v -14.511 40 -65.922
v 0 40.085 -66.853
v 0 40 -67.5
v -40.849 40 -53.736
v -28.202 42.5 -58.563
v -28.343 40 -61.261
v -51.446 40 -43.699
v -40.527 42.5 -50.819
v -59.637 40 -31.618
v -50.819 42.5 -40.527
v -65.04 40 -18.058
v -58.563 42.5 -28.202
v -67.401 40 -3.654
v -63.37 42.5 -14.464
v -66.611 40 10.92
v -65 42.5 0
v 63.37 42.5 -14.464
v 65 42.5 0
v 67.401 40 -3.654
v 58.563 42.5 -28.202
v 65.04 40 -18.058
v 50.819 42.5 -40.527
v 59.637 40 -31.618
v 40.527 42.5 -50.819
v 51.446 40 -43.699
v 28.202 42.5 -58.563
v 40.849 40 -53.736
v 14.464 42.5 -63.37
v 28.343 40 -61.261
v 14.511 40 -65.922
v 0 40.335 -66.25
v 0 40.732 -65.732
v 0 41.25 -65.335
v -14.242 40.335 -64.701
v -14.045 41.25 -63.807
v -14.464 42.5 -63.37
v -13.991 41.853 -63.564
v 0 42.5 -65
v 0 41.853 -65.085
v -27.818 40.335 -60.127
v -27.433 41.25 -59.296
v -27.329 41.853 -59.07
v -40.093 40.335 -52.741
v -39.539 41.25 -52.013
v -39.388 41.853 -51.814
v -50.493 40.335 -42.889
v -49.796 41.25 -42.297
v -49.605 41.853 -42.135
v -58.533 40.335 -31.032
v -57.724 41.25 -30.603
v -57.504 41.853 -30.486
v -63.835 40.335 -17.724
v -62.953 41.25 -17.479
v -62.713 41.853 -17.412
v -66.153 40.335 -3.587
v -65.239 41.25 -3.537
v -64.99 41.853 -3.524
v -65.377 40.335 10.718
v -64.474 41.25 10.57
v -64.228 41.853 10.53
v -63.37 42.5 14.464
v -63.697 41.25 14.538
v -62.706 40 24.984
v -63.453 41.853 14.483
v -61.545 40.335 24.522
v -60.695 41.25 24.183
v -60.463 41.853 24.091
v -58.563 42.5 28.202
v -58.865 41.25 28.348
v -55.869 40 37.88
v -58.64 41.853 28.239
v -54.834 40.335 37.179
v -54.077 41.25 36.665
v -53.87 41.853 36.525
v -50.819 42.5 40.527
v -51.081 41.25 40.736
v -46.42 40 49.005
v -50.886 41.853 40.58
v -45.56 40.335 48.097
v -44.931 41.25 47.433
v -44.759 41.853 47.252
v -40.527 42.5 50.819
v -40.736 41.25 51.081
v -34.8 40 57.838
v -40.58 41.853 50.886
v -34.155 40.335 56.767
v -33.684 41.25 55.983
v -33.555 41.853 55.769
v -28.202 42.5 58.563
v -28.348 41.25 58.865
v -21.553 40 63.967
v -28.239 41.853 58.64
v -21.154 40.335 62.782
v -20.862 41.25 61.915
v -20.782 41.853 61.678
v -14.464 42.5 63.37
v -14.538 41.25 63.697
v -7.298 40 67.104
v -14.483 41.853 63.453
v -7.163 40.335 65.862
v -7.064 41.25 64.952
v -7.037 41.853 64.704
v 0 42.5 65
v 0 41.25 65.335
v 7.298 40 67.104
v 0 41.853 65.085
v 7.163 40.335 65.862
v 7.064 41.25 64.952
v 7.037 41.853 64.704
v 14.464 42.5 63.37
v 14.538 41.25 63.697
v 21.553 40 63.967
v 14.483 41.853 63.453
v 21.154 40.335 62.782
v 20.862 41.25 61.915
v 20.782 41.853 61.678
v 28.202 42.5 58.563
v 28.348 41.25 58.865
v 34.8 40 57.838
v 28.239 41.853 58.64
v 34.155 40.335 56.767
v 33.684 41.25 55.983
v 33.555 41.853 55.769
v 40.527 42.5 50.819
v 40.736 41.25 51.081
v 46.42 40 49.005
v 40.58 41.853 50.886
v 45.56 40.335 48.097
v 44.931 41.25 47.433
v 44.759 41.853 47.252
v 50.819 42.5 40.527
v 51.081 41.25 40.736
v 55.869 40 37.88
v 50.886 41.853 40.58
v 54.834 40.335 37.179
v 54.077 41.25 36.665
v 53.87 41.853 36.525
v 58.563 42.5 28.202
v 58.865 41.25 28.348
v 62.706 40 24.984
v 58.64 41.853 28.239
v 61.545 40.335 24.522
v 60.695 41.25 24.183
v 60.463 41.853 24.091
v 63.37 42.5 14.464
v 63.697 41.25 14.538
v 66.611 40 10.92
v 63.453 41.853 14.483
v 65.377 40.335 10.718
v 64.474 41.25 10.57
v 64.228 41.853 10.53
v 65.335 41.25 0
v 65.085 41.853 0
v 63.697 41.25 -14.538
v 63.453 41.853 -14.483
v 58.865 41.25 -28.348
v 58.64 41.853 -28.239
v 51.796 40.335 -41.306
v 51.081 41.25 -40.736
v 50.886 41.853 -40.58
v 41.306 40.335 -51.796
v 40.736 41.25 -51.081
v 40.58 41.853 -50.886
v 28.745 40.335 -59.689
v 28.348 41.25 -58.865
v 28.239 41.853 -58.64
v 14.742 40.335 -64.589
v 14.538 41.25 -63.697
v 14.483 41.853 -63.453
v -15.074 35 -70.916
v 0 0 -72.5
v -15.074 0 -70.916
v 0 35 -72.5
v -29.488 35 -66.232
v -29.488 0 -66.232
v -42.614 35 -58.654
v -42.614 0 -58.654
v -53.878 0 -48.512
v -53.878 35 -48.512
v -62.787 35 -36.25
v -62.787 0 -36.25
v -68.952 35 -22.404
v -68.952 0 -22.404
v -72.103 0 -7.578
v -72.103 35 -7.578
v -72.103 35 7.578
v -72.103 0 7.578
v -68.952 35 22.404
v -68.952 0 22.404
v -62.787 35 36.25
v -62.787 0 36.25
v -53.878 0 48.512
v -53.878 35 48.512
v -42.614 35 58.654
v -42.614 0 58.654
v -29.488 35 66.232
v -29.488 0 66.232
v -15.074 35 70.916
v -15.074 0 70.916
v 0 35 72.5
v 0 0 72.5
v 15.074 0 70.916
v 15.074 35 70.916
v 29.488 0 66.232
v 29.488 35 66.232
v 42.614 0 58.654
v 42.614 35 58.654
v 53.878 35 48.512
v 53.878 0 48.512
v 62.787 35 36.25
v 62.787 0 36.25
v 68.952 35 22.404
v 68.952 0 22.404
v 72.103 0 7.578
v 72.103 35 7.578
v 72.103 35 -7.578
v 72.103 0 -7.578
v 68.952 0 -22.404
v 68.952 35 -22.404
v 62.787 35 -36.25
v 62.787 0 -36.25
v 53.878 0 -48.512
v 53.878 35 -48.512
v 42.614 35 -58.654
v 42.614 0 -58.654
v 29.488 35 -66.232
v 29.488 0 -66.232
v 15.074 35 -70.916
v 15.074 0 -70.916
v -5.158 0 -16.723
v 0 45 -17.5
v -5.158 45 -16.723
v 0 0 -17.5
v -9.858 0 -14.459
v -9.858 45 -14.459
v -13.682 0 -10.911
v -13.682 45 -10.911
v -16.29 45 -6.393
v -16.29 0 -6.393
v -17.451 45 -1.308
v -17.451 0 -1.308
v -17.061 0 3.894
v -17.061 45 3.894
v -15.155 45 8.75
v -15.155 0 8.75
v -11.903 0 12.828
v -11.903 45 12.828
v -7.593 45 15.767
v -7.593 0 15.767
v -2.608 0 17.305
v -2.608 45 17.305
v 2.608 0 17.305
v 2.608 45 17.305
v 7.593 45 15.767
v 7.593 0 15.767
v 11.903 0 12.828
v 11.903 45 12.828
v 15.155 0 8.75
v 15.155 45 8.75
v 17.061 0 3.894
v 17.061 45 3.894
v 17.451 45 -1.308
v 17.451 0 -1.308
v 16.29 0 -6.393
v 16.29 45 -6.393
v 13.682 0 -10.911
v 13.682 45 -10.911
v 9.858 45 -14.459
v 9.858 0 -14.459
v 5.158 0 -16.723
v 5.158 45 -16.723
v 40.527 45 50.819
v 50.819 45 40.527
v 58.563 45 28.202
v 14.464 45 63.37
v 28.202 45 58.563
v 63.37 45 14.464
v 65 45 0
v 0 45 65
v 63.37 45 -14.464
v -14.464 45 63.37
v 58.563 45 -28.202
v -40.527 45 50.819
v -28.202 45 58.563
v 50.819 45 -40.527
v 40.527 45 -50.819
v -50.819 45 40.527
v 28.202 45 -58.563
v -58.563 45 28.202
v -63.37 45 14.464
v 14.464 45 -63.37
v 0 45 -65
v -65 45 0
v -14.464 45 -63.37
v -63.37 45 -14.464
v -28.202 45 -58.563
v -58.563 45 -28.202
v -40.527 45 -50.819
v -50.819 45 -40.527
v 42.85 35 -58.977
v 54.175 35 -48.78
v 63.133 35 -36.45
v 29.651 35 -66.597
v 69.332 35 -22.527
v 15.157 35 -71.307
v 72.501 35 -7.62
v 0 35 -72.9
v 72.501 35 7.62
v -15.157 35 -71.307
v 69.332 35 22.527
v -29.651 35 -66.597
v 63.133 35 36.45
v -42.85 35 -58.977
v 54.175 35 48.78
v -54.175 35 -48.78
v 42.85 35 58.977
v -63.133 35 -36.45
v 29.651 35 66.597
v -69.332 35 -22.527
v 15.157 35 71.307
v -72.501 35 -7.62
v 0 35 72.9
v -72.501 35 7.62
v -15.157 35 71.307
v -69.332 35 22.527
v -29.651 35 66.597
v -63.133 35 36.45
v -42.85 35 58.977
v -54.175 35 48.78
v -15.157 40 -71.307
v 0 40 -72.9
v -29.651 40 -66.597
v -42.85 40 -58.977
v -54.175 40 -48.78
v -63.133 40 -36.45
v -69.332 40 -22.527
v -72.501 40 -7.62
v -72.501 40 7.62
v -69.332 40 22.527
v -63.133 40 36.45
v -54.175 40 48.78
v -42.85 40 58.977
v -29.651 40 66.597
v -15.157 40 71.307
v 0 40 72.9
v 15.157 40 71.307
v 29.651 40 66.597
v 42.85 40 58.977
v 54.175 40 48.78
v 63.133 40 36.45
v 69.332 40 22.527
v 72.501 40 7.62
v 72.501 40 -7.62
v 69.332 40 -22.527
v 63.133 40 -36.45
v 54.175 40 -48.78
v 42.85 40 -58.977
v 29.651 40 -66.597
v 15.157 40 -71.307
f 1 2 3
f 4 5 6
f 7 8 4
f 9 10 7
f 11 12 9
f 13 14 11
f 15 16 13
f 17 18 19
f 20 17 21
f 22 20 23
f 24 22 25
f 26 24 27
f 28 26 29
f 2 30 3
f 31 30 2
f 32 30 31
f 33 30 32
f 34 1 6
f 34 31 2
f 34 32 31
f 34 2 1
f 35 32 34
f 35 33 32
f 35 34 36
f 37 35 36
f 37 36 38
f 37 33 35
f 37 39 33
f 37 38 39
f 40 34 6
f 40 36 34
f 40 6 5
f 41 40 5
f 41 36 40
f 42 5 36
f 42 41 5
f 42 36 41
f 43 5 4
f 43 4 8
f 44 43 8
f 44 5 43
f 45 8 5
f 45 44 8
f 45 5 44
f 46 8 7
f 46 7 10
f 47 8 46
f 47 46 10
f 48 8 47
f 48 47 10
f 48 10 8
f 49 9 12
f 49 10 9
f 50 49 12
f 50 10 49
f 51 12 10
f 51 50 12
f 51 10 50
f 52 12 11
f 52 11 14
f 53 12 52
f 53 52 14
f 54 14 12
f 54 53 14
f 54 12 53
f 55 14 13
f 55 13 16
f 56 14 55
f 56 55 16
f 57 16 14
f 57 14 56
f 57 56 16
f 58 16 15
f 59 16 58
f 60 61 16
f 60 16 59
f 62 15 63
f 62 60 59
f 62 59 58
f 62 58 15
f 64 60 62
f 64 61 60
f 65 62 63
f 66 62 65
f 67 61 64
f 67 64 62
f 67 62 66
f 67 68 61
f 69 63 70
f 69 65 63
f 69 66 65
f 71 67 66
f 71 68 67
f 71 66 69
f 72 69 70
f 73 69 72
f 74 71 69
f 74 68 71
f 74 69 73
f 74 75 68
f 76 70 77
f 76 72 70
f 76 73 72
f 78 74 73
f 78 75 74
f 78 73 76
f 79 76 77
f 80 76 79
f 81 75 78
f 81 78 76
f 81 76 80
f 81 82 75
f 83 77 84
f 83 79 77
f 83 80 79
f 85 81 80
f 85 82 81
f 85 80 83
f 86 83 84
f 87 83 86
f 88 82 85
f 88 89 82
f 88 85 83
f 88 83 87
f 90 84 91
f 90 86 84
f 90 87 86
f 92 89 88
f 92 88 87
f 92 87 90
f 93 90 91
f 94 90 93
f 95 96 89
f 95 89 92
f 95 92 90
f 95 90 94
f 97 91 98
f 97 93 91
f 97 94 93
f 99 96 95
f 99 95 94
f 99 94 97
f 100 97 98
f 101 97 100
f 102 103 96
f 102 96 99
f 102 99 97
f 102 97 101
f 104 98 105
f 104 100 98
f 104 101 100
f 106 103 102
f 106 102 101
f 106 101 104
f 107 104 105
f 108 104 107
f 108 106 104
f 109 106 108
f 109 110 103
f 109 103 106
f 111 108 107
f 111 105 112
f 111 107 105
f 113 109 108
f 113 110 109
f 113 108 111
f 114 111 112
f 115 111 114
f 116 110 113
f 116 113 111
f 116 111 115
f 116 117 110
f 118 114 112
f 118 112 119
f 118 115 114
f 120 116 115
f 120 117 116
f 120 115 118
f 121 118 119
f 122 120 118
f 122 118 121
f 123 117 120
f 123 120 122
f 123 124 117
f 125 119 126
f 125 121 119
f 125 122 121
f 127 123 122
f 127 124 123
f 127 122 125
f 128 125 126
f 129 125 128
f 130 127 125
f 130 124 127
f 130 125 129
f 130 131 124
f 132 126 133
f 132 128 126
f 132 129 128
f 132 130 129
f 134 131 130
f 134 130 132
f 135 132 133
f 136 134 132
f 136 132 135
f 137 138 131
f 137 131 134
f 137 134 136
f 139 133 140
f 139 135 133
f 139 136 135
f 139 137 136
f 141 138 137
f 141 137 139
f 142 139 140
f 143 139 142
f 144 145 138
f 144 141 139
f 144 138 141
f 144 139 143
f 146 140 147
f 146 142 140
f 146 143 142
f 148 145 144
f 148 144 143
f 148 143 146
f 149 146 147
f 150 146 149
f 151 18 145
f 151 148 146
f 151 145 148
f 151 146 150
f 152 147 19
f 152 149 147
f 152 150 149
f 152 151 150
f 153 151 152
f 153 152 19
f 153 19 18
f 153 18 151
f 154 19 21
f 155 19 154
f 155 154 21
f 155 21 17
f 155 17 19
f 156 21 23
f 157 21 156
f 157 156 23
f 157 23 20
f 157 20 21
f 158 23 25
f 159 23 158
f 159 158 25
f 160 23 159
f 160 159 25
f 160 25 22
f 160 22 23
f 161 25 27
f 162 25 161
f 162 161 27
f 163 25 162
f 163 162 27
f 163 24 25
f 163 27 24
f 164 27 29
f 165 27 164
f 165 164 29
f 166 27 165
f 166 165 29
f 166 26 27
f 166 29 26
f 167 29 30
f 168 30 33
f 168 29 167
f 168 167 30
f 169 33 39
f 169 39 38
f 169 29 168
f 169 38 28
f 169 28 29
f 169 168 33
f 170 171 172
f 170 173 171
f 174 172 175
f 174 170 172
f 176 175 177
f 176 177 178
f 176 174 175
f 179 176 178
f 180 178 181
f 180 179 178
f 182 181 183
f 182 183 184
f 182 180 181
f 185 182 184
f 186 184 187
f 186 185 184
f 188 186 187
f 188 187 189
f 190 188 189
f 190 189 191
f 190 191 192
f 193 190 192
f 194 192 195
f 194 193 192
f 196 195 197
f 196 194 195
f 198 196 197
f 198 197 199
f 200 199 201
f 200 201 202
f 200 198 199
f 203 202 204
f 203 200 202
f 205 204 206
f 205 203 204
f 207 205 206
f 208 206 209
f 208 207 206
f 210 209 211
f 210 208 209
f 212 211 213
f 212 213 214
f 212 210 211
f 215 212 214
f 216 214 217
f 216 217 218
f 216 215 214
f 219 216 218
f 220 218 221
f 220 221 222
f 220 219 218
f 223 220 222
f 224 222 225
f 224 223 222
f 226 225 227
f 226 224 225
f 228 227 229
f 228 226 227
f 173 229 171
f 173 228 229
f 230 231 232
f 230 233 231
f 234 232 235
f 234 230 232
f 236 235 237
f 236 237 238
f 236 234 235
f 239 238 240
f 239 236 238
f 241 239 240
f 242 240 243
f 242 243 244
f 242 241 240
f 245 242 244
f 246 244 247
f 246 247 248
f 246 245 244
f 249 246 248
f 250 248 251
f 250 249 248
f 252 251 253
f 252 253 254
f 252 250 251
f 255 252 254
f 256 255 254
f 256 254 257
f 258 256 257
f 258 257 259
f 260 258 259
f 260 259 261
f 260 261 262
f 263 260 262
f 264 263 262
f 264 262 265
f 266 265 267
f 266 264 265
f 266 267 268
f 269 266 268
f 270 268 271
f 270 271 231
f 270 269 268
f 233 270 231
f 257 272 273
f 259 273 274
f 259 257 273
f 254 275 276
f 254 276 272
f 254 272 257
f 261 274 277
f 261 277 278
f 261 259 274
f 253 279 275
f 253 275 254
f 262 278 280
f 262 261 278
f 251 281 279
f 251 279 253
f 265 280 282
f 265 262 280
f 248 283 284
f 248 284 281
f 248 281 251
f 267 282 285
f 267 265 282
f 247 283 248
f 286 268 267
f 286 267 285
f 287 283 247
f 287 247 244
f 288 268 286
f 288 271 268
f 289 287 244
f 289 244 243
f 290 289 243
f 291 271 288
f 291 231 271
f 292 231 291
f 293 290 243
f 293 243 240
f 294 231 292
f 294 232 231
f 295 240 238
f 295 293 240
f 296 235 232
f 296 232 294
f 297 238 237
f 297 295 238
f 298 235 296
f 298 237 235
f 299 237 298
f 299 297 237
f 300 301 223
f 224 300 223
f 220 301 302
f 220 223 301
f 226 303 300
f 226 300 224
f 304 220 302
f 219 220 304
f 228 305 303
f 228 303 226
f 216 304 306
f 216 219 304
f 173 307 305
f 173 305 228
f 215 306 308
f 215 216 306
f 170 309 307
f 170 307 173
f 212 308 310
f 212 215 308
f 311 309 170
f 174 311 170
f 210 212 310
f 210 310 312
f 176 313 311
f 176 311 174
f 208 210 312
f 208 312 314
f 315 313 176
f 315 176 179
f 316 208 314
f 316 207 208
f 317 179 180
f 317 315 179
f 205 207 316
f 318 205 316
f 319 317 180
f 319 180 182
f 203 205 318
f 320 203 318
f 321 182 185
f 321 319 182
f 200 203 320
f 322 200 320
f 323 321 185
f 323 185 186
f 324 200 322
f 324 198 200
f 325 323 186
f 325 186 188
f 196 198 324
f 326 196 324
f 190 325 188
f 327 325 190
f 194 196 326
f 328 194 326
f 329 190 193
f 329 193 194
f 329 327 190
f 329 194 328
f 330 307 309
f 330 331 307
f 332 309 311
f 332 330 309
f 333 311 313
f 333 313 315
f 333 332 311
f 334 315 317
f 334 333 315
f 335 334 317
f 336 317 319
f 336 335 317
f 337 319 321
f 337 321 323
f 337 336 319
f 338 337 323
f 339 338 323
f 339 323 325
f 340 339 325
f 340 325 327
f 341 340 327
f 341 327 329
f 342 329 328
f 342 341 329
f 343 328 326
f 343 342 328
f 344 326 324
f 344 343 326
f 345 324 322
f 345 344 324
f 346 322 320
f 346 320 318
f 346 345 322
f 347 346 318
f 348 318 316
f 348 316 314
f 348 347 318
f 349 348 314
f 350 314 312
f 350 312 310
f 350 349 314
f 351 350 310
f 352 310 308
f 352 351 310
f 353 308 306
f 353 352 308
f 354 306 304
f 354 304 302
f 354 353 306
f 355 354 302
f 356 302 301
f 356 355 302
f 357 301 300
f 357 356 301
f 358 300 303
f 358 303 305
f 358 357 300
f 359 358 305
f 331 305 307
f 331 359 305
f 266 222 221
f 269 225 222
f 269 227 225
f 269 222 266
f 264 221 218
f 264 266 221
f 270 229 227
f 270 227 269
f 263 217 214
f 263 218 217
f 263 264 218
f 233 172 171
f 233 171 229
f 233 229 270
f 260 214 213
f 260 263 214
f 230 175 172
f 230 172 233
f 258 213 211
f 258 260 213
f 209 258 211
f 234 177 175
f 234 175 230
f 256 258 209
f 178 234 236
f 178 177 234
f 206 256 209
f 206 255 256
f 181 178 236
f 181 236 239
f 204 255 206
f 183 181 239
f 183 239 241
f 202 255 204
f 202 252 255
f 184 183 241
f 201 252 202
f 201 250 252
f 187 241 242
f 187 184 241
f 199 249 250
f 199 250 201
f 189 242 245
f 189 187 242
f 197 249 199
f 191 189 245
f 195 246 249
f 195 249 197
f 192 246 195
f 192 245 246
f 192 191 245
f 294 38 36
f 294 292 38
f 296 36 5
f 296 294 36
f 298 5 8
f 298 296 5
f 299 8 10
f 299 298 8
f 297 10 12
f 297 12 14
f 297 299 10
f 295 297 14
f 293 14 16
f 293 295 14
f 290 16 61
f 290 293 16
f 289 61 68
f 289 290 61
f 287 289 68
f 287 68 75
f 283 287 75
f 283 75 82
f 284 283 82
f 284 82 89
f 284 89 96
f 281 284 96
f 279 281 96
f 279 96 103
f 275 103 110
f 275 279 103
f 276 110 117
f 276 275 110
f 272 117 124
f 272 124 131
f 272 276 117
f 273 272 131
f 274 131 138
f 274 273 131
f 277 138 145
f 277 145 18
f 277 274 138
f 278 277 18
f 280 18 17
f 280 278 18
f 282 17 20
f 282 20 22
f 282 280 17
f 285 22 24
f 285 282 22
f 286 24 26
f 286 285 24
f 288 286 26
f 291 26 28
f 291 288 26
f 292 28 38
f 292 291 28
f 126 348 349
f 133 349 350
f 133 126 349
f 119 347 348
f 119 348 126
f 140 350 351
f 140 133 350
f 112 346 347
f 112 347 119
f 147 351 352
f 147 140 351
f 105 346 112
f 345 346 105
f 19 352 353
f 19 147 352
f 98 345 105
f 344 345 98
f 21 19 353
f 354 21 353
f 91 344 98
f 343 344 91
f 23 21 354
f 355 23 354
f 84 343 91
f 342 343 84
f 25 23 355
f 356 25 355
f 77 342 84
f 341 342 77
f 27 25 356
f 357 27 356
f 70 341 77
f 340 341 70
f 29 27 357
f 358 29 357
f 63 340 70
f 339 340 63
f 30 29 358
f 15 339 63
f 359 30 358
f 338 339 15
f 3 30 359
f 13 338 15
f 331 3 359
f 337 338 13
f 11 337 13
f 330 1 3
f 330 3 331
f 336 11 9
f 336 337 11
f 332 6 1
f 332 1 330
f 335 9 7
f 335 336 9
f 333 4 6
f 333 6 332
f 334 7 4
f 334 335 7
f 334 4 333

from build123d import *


with BuildPart() as part:
    # 草图1 → 旋转1 (revolve)
    with BuildSketch(Plane(origin=(0, 0, 0), x_dir=(0, 0, -1), z_dir=(1, 0, 0)), mode=Mode.PRIVATE) as revolve_1_sk:
        with BuildLine():
            Line((-17.5, 45), (-17.5, 0))
            Line((-17.5, 0), (-72.5, 0))
            Line((-72.5, 0), (-72.5, 35))
            Line((-72.5, 35), (-72.9, 35))
            Line((-72.9, 35), (-72.9, 40))
            Line((-72.9, 40), (-67.5, 40))
            ThreePointArc((-67.5, 40), (-65.732233047, 40.732233047), (-65, 42.5))
            Line((-65, 42.5), (-65, 45))
            Line((-65, 45), (-17.5, 45))
        make_face()
    revolve(revolve_1_sk.sketch.rotate(Axis((0, 0, 0), (0, 1, 0)), 180), axis=Axis((0, 0, 0), (0, 1, 0)))


solid = part.part
